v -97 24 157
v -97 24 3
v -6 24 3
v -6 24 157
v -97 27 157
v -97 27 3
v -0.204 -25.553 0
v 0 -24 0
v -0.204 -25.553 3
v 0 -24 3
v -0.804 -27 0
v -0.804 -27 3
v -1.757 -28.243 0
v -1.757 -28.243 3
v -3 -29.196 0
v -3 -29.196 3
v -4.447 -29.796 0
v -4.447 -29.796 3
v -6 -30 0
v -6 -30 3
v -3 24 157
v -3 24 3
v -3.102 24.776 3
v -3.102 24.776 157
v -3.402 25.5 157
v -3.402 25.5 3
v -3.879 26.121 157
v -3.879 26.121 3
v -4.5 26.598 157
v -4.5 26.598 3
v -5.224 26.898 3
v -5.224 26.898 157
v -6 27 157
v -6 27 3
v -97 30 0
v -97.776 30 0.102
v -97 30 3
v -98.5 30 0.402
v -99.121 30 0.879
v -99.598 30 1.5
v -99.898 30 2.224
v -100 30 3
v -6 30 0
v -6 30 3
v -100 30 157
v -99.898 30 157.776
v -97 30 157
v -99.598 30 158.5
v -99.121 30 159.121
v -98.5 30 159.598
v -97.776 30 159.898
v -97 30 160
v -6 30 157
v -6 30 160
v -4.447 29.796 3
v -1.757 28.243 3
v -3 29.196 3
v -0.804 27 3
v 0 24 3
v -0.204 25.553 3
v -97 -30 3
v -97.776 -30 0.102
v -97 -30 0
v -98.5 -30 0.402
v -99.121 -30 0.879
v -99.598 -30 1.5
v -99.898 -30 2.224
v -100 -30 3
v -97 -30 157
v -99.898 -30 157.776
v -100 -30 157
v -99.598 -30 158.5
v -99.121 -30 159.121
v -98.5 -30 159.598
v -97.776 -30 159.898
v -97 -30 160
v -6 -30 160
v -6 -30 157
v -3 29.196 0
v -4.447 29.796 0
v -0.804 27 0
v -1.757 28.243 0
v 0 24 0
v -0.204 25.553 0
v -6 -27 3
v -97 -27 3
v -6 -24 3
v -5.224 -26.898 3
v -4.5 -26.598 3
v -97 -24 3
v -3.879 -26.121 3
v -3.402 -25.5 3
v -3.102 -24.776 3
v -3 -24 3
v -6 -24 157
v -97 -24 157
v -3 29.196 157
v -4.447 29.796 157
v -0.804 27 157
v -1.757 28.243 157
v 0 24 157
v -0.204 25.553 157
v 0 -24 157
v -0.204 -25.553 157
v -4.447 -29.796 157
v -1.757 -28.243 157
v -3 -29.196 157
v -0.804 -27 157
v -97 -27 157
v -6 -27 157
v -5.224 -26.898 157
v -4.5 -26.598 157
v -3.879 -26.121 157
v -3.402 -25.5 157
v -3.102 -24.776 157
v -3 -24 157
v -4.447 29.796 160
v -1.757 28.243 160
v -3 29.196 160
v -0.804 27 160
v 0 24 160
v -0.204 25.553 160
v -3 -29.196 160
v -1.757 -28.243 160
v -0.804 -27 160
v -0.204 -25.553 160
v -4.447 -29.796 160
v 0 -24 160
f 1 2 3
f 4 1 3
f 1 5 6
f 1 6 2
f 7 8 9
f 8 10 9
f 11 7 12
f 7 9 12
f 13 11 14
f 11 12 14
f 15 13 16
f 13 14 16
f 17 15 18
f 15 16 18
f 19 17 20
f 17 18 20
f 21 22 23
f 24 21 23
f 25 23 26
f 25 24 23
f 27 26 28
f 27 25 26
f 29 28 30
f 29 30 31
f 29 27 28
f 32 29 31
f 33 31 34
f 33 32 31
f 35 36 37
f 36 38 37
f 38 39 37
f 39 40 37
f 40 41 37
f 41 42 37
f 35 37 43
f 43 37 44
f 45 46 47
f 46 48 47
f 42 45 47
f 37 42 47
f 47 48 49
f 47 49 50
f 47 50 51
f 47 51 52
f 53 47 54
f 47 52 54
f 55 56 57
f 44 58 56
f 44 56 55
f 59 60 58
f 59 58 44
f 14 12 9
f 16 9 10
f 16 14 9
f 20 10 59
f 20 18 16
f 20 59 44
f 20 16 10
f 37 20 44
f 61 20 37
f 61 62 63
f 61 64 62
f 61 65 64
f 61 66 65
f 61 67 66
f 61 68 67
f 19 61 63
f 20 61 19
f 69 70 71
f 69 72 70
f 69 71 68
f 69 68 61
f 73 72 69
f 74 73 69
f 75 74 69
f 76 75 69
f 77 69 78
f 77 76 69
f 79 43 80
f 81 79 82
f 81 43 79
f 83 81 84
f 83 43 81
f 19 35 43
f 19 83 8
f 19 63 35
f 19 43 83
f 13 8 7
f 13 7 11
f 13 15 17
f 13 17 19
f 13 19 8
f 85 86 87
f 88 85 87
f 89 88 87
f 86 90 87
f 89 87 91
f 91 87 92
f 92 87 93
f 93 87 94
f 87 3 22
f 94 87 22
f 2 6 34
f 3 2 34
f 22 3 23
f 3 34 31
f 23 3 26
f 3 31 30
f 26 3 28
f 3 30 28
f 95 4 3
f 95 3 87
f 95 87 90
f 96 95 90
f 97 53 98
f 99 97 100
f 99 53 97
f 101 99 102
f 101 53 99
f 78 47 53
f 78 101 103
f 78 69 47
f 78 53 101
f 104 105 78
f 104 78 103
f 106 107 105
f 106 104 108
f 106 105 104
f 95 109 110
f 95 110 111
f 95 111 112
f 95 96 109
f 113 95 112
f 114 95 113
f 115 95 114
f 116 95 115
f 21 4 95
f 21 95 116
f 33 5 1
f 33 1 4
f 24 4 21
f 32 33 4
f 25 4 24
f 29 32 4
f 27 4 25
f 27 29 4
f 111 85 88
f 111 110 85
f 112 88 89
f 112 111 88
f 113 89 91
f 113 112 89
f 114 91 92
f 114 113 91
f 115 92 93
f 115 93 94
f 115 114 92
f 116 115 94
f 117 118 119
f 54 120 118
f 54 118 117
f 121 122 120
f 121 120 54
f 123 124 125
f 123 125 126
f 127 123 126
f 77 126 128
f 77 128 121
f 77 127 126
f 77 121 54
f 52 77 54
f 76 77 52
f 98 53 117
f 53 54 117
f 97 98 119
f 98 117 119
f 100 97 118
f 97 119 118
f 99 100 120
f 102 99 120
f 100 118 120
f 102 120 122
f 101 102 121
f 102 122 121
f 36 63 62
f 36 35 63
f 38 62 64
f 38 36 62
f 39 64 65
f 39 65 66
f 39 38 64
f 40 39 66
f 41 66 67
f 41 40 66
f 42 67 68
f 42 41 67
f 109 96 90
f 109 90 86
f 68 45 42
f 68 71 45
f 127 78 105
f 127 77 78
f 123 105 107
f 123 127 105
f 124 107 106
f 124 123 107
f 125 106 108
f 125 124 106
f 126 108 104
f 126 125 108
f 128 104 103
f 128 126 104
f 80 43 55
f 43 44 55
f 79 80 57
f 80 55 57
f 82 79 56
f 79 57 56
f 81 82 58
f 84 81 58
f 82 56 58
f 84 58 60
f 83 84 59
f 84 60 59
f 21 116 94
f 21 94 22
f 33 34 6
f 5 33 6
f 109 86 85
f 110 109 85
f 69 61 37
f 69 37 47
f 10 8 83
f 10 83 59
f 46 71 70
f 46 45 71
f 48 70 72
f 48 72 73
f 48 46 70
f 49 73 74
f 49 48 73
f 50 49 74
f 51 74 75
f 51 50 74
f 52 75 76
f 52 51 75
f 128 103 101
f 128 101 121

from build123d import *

# Parameters (mm, degrees)
F1_DEPTH = 30
F3_DEPTH = 154
F4_R     = 3
F4_2_R   = 3
F5_R     = 6


with BuildPart() as f1:
    # F0 (on Front) → F1 (new body, symmetric)
    with BuildSketch(Plane.XZ):
        Polygon((-100, 0), (0, 0), (0, 3), (-97, 3), (-97, 157), (0, 157), (0, 160), (-100, 160), align=None)
    extrude(amount=F1_DEPTH, both=True)

    # F4
    f4_edges = [f1.edges().sort_by_distance(p)[0] for p in [
        (-100, 0, 160),
        (-100, 0, 0),
    ]]
    fillet(f4_edges, radius=F4_R)

    # F5
    f5_edges = [f1.edges().sort_by_distance(p)[0] for p in [
        (0, -30, 158.5),
        (0, 30, 158.5),
        (0, 30, 1.5),
        (0, -30, 1.5),
    ]]
    fillet(f5_edges, radius=F5_R)


with BuildPart() as f3:
    # F2 (on face) → F3 (new body, through all)
    with BuildSketch(Plane.XY.offset(3)):
        Polygon((-97, -24), (-97, -27), (-3, -27), (-3, 27), (-97, 27), (-97, 24), (-6, 24), (-6, -24), align=None)
    extrude(amount=F3_DEPTH)

    # F4#2
    f4_2_edges = [f3.edges().sort_by_distance(p)[0] for p in [
        (-3, -27, 80),
        (-3, 27, 80),
    ]]
    fillet(f4_2_edges, radius=F4_2_R)


solid = Compound([f1.part, f3.part])
